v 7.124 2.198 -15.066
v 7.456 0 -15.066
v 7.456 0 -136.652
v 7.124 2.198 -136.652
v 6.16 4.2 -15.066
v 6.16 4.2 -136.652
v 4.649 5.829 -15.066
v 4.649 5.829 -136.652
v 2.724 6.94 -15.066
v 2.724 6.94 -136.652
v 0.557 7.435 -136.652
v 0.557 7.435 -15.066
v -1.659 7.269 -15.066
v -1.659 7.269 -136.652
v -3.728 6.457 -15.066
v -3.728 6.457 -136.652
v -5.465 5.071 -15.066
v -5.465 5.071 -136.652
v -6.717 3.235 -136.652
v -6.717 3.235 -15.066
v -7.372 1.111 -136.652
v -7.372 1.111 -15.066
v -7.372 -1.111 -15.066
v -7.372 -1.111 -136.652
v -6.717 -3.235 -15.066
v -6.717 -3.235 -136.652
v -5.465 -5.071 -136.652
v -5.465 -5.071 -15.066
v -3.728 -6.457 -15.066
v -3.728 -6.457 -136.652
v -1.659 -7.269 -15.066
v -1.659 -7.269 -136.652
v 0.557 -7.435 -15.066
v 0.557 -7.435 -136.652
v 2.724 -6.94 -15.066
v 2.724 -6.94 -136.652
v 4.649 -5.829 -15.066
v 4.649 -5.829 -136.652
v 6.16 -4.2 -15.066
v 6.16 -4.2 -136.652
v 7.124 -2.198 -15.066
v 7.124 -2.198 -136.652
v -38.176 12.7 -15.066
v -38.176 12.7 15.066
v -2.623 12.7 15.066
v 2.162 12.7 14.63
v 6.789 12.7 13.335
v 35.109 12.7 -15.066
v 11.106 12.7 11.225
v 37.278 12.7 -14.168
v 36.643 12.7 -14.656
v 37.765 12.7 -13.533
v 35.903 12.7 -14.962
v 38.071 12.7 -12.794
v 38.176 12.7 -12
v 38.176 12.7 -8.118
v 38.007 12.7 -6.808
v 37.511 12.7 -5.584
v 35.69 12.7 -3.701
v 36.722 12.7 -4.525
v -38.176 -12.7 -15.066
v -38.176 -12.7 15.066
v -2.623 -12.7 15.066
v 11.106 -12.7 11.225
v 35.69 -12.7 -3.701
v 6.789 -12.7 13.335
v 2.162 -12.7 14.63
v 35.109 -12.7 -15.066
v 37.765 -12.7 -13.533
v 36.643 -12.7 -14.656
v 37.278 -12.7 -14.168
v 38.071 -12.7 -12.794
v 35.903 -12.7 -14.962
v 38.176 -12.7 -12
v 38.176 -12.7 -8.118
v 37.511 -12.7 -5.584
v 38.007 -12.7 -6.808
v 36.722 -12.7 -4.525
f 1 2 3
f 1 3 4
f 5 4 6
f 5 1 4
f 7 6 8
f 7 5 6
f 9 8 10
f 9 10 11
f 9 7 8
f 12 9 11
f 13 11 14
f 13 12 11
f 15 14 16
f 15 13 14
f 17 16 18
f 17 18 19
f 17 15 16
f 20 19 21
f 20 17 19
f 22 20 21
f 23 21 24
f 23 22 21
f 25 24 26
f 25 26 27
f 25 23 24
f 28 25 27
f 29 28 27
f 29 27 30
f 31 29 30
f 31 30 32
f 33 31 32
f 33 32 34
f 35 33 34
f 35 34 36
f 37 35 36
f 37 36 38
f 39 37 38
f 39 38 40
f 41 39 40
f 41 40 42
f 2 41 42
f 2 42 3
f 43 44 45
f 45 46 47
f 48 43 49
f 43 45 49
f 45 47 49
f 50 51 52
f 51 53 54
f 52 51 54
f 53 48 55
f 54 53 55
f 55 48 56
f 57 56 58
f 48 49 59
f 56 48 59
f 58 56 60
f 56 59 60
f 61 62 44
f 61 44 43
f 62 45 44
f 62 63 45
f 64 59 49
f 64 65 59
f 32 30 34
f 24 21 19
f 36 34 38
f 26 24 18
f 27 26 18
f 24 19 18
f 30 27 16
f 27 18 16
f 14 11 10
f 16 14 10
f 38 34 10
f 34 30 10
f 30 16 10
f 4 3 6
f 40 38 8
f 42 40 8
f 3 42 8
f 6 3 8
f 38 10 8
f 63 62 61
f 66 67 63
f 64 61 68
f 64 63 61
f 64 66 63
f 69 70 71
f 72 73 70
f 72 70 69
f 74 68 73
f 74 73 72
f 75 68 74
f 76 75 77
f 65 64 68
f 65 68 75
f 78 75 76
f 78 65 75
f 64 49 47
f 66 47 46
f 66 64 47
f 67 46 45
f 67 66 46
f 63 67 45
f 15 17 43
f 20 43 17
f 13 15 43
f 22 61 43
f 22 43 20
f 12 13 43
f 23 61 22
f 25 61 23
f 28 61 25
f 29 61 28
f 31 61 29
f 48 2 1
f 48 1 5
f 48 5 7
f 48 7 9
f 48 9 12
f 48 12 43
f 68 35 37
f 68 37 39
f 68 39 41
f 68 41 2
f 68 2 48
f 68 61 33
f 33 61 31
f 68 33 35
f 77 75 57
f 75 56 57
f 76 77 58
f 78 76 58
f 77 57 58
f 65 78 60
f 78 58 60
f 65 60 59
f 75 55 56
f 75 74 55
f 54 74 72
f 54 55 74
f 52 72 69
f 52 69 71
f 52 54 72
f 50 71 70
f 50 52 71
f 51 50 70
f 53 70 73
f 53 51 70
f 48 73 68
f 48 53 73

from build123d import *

# Parameters (mm, degrees)
F1_DEPTH = 12.7
F2_R     = 7.455635
F3_DEPTH = 136.652
F4_R     = 5.167347
F5_R     = 3.066051
F6_R     = 26.453002


with BuildPart() as f1:
    # F0 (on Front) → F1 (new body, symmetric)
    with BuildSketch(Plane.XZ):
        Polygon((38.175546, -5.210182), (4.778824, 15.066399), (-38.175546, 15.066399), (-38.175546, -15.066399), (38.175546, -15.066399), align=None)
    extrude(amount=F1_DEPTH, both=True)

    # F2 (on Top) → F3 (join)
    with BuildSketch(Plane.XY):
        Circle(F2_R)
    extrude(amount=-F3_DEPTH)

    # F4
    f4_edges = [f1.edges().sort_by_distance(p)[0] for p in [
        (38.175546, 0, -5.210182),
    ]]
    fillet(f4_edges, radius=F4_R)

    # F5
    f5_edges = [f1.edges().sort_by_distance(p)[0] for p in [
        (38.175546, 0, -15.066399),
    ]]
    fillet(f5_edges, radius=F5_R)

    # F6
    f6_edges = [f1.edges().sort_by_distance(p)[0] for p in [
        (4.778824, 0, 15.066399),
    ]]
    fillet(f6_edges, radius=F6_R)


solid = f1.part
